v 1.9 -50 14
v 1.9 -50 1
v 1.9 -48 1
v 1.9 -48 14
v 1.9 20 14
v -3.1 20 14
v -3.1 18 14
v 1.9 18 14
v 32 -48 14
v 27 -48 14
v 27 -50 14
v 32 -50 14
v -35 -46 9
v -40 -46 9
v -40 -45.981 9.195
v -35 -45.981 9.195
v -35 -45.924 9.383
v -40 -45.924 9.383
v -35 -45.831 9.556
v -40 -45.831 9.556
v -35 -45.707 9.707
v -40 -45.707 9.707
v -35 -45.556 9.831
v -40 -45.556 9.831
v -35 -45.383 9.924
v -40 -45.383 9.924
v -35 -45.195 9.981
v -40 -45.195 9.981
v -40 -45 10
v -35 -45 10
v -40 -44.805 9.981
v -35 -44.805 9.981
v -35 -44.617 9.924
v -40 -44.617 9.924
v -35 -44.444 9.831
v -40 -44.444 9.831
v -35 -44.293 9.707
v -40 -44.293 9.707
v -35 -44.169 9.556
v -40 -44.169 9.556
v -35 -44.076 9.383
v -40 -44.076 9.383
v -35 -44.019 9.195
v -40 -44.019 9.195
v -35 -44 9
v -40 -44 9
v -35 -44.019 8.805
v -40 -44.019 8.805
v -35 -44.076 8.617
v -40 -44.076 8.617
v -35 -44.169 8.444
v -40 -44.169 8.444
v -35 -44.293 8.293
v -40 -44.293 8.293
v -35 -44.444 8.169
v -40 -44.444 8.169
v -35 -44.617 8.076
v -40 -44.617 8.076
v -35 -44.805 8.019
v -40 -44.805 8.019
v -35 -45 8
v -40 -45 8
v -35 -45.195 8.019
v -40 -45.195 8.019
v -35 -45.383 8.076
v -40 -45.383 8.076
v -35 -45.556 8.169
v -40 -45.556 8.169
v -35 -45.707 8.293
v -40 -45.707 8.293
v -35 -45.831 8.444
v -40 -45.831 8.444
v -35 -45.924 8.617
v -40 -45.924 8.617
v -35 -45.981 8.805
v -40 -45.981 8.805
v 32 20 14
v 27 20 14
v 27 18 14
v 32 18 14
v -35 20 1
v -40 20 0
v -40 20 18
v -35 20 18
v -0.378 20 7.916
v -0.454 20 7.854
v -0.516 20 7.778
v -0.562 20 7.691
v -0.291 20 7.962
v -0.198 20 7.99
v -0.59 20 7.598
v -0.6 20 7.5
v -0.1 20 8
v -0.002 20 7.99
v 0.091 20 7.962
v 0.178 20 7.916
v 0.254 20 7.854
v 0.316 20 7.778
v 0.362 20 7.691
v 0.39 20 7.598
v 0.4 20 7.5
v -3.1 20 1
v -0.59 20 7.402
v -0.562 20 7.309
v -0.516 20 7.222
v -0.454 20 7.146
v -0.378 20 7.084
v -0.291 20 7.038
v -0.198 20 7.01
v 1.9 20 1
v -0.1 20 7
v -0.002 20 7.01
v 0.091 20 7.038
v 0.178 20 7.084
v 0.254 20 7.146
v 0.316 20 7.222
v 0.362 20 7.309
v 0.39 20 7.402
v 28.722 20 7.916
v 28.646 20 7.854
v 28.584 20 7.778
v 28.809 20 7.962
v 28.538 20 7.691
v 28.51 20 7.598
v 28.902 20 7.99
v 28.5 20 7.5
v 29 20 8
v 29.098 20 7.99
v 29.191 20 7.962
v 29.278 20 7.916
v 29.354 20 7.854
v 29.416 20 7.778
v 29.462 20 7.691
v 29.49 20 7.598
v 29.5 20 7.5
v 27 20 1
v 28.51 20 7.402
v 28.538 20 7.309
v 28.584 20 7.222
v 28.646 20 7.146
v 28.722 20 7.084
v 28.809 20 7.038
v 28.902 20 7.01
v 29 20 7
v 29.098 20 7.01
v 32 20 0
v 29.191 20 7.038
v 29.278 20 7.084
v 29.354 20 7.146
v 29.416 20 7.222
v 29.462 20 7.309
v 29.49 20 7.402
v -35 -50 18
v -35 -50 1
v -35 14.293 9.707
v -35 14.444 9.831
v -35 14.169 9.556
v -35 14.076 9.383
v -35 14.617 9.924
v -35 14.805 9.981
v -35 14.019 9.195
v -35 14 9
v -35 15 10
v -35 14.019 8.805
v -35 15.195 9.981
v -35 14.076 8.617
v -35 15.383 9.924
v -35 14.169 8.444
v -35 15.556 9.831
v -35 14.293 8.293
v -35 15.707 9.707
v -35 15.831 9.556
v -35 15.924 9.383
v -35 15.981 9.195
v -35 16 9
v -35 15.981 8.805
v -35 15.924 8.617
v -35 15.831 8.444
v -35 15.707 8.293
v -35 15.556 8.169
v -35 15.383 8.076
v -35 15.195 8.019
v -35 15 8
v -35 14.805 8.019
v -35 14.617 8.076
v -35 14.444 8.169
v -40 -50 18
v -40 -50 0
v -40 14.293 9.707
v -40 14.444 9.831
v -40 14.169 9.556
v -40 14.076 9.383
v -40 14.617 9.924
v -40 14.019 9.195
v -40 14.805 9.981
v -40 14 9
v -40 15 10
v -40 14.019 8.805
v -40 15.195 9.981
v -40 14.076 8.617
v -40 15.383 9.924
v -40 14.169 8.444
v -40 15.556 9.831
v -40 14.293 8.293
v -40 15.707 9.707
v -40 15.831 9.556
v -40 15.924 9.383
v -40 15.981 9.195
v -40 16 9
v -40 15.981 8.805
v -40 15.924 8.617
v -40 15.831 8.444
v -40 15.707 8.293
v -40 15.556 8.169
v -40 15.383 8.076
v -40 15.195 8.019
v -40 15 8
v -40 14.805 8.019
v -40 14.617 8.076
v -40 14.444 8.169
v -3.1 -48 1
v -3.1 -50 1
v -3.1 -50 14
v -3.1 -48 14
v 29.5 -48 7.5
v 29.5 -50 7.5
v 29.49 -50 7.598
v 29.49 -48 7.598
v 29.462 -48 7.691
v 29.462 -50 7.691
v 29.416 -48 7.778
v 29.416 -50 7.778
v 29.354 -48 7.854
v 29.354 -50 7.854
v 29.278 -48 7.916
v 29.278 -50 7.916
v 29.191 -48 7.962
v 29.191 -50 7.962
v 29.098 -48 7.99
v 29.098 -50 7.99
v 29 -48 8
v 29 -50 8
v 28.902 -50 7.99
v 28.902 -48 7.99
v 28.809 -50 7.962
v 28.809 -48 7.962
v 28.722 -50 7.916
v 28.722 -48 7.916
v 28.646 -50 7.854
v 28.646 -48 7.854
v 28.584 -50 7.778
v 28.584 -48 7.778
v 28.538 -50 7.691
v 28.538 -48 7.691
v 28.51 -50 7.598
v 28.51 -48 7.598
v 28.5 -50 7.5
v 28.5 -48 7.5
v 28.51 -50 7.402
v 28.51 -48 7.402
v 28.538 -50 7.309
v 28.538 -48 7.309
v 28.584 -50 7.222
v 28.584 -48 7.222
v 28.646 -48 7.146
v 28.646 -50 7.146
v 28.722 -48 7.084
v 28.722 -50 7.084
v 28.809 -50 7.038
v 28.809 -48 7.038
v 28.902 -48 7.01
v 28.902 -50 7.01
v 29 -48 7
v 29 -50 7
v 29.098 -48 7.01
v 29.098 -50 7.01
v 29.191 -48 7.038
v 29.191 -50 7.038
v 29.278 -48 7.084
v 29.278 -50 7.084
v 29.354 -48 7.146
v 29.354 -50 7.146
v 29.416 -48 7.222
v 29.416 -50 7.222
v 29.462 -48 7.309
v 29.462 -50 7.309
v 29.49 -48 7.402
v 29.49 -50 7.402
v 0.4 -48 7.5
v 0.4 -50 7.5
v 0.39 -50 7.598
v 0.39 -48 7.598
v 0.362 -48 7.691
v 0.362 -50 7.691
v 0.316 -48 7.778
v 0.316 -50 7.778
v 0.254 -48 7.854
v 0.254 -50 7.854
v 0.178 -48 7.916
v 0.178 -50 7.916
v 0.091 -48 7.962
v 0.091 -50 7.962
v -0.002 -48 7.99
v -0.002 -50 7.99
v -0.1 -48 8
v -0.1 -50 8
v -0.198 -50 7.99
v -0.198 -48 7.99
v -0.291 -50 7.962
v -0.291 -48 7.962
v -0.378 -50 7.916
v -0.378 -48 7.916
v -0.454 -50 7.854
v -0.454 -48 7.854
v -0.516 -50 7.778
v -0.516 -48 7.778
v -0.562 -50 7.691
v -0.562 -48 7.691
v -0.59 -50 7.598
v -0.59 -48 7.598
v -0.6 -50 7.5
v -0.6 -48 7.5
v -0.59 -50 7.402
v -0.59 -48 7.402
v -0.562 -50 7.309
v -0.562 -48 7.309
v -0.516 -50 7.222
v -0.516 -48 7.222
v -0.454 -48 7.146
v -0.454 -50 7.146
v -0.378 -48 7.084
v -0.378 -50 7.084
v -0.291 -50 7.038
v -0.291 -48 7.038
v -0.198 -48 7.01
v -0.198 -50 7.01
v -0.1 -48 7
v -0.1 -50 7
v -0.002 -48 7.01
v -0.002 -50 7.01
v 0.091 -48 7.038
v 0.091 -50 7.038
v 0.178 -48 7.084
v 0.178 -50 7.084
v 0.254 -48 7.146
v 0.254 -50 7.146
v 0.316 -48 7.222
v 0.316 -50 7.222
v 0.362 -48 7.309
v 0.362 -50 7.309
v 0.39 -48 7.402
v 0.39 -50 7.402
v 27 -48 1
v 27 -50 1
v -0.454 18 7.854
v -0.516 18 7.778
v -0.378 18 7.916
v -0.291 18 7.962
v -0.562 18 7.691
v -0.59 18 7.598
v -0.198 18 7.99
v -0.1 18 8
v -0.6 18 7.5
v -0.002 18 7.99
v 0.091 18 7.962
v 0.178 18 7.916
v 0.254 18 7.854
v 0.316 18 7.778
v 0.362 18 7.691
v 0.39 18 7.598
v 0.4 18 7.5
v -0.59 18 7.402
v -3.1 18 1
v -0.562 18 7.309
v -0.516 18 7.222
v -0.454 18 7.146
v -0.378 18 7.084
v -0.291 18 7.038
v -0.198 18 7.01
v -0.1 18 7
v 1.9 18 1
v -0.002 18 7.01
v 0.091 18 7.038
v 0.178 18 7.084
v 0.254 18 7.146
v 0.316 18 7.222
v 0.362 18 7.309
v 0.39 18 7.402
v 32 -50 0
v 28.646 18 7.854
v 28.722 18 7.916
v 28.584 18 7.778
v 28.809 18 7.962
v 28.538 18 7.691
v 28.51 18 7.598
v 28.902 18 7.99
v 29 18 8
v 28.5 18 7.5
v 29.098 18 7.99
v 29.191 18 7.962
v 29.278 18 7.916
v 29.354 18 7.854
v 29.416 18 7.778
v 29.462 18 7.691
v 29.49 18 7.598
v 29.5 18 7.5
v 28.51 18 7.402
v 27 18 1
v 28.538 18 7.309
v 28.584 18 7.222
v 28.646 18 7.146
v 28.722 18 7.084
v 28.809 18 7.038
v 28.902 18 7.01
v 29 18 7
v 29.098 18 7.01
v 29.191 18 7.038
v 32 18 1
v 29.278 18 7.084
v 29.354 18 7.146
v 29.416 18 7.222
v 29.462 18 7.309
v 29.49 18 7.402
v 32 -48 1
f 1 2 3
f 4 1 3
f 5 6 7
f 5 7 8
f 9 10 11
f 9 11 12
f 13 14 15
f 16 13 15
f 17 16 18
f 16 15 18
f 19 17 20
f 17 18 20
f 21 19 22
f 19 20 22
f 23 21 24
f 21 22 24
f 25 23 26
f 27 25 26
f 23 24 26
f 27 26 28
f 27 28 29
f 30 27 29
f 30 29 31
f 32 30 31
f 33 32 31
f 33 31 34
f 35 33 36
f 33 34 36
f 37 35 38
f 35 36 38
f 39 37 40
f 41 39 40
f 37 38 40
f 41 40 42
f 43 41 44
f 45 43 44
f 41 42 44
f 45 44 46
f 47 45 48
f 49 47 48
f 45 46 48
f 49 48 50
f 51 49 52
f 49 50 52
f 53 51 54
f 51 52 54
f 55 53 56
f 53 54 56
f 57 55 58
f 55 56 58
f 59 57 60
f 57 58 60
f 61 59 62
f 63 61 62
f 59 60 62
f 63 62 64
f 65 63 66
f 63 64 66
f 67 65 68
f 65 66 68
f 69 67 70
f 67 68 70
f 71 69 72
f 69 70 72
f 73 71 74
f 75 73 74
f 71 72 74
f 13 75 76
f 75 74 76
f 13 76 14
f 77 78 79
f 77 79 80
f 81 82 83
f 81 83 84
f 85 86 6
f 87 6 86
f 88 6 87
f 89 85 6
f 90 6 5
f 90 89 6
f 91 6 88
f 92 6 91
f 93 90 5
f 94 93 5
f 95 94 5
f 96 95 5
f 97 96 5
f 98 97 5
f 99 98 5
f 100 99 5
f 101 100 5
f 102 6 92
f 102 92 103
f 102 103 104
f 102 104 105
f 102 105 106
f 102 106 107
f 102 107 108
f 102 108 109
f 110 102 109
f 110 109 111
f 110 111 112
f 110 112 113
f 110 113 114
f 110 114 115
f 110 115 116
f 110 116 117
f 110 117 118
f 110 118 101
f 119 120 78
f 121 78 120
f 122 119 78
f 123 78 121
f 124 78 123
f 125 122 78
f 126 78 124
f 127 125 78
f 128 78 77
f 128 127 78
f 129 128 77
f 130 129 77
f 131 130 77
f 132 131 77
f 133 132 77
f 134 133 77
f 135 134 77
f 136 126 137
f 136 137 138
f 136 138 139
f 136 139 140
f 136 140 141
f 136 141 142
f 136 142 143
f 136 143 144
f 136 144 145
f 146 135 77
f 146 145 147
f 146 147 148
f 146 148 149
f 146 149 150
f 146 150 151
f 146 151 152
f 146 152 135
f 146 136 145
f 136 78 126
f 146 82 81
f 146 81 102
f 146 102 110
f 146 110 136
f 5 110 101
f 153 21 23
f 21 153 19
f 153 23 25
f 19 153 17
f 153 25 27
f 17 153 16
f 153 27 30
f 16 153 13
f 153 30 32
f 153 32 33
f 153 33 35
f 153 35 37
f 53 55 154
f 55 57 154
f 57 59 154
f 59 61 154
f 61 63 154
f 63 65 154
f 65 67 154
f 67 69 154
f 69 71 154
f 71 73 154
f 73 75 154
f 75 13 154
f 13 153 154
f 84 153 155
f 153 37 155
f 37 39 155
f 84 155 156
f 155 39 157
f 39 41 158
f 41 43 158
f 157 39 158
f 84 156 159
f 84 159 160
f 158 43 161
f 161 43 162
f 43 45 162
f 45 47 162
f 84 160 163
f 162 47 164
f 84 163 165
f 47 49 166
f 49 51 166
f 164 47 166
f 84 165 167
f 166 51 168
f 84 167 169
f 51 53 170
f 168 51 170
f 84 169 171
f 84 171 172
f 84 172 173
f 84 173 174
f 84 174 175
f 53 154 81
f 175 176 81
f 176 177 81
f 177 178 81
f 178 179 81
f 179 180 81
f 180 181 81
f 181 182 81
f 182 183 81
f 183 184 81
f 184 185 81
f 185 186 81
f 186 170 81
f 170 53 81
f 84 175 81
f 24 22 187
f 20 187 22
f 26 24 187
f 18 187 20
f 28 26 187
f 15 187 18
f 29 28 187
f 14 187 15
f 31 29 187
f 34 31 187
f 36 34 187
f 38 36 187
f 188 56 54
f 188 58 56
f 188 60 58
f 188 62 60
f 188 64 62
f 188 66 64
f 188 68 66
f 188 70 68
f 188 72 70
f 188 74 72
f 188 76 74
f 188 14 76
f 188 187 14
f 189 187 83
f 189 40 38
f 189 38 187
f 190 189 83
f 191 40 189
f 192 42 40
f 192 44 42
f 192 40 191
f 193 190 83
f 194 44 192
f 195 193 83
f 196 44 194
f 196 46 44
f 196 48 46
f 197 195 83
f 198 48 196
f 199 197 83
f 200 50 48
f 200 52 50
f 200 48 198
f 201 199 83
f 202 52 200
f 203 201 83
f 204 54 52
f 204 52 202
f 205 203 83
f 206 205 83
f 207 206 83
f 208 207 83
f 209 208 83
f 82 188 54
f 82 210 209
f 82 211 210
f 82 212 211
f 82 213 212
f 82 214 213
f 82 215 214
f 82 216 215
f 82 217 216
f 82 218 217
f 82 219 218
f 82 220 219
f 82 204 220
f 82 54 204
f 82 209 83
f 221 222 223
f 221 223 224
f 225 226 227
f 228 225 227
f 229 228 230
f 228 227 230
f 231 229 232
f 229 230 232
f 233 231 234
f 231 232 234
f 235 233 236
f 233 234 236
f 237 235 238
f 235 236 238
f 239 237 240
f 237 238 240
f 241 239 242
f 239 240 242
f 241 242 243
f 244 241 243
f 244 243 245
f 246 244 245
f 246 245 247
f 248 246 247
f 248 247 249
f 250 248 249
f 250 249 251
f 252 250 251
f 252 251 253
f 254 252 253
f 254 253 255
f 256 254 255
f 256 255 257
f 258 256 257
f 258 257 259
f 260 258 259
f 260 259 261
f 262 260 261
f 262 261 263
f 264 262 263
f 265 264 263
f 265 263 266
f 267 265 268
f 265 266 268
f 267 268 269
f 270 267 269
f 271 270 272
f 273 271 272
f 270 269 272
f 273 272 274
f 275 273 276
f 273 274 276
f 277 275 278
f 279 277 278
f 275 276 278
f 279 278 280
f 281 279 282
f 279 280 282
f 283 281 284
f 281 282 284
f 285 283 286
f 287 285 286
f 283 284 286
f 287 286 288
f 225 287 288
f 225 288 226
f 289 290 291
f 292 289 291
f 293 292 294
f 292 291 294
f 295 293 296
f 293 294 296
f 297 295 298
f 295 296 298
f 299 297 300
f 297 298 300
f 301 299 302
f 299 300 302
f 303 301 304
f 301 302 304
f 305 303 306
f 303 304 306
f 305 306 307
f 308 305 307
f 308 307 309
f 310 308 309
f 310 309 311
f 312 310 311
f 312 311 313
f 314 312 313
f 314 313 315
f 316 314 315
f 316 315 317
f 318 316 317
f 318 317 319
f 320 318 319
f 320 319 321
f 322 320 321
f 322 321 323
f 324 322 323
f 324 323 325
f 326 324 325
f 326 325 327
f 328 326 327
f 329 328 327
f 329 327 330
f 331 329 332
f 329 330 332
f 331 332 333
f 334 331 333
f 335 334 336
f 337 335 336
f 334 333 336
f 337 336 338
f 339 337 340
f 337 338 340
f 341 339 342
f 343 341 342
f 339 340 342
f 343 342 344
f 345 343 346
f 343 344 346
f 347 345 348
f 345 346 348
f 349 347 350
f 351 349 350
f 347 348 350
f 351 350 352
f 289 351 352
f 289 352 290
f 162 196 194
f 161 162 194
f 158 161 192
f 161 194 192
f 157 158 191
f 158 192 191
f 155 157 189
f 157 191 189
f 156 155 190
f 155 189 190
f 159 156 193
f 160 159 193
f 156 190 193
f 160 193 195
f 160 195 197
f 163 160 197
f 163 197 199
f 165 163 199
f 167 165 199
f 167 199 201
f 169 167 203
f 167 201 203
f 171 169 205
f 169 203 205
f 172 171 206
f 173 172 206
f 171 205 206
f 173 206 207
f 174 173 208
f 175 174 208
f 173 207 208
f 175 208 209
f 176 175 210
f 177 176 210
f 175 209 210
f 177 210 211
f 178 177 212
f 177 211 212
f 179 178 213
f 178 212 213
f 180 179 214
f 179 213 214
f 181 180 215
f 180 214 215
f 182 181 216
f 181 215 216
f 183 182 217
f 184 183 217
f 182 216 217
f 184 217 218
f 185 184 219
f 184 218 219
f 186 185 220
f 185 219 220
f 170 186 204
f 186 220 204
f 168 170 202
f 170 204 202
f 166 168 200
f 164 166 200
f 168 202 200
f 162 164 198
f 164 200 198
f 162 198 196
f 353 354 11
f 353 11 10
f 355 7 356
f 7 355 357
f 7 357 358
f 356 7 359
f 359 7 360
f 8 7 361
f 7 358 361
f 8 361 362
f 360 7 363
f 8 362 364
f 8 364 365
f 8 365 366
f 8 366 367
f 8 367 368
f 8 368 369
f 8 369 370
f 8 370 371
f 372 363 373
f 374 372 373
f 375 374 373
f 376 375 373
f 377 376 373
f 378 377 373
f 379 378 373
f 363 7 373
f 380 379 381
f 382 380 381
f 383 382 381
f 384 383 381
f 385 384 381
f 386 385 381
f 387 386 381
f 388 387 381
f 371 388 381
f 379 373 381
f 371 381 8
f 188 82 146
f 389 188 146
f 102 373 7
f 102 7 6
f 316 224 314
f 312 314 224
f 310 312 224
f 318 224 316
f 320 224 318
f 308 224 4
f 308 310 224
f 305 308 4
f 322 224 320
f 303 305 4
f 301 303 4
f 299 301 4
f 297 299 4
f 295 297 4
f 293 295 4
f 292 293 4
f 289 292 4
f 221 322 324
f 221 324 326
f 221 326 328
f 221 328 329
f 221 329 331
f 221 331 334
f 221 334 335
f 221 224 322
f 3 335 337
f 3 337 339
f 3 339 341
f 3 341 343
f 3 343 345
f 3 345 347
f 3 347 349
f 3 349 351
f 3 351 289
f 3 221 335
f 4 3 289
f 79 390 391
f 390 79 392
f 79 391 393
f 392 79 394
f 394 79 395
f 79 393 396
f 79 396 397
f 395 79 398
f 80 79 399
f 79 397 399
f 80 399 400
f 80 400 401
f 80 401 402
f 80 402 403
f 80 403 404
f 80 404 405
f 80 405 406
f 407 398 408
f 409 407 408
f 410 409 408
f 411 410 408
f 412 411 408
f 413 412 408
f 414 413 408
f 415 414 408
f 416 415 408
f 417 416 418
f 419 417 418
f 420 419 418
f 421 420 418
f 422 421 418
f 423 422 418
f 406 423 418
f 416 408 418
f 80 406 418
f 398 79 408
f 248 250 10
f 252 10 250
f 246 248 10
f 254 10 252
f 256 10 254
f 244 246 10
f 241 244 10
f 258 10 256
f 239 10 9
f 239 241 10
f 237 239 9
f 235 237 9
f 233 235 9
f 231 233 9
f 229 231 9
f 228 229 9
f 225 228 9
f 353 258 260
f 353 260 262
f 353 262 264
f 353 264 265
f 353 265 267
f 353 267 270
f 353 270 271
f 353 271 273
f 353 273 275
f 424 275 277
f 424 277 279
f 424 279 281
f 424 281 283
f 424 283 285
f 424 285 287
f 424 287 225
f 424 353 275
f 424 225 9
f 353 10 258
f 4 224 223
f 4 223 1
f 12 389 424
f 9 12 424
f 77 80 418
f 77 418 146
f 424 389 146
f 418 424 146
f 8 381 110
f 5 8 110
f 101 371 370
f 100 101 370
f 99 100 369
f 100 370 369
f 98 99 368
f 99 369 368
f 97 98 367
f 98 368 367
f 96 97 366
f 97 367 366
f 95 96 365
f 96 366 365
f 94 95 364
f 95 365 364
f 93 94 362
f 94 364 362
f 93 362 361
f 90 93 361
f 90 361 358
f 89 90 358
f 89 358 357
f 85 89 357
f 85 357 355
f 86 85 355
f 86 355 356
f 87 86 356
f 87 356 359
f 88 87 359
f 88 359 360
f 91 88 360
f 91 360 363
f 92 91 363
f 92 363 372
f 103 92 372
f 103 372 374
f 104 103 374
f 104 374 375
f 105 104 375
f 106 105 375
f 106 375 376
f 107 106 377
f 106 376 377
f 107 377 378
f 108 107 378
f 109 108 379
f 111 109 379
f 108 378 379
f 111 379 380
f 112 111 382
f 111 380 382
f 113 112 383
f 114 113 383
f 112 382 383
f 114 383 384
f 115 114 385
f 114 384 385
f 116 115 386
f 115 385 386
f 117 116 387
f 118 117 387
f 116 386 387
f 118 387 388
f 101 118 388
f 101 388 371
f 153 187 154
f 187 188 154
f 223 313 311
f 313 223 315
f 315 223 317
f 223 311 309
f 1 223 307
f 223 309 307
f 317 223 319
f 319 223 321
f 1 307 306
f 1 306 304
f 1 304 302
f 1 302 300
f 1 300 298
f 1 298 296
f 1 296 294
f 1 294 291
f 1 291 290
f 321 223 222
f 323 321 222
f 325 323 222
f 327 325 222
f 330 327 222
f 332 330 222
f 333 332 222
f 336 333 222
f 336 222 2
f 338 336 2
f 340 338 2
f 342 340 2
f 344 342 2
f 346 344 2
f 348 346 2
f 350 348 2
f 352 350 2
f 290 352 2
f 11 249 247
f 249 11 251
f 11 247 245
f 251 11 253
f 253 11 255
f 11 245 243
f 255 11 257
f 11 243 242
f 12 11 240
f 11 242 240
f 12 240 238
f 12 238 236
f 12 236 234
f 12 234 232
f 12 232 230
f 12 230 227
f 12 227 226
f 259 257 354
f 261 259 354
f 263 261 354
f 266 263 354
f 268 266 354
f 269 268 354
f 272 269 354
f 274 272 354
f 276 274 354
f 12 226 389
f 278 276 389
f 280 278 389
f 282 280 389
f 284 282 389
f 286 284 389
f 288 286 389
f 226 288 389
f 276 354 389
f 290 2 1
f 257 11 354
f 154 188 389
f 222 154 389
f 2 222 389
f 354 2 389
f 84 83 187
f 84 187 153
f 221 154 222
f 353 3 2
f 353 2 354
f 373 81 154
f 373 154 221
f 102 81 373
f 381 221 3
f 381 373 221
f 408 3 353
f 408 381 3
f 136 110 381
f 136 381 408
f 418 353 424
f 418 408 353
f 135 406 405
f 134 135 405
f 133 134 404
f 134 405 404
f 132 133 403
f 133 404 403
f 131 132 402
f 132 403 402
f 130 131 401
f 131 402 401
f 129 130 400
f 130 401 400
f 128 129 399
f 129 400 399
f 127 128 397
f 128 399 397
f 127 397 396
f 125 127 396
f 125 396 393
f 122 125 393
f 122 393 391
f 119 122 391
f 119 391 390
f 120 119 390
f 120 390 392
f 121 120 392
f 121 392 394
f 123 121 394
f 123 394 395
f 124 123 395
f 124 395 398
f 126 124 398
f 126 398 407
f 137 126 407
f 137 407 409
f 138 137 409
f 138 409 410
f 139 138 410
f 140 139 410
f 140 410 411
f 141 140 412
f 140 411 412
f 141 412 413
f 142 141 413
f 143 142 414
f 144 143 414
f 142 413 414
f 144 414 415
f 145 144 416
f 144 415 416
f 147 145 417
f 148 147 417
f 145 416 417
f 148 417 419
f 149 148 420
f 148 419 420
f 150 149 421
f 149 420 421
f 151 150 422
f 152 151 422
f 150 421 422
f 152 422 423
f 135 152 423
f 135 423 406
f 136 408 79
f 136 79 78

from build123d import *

# Parameters (mm, degrees)
F0_W     = 72
F0_H     = 70
F1_DEPTH = 1
F2_W     = 5
F2_H     = 70
F3_DEPTH = 17
F4_R     = 1
F5_DEPTH = 5
F2_H_2   = 2
F6_DEPTH = 13
F7_R     = 0.5
F8_DEPTH = 70.001


with BuildPart() as f1:
    # F0 (on Top) → F1 (new body)
    with BuildSketch(Plane.XY):
        with Locations((-4, -15)):
            Rectangle(F0_W, F0_H)
    extrude(amount=F1_DEPTH)

    # F2 (on face) → F3 (join)
    with BuildSketch(Plane.XY.offset(1)):
        with Locations((-37.5, -15)):
            Rectangle(F2_W, F2_H)
    extrude(amount=F3_DEPTH)

    # F4 (on face) → F5 (cut, through all)
    with BuildSketch(Plane(origin=(-40, 0, 0), x_dir=(0, -1, 0), z_dir=(-1, 0, 0))):
        with Locations((-15, 9)):
            Circle(F4_R)
        with Locations((45, 9)):
            Circle(F4_R)
    extrude(amount=-F5_DEPTH, mode=Mode.SUBTRACT)

    # F2 (on face) → F6 (join)
    with BuildSketch(Plane.XY.offset(1)):
        with Locations((-0.6, 19)):
            Rectangle(F2_W, F2_H_2)
        with Locations((29.5, 19)):
            Rectangle(F2_W, F2_H_2)
        with Locations((-0.6, -49)):
            Rectangle(F2_W, F2_H_2)
        with Locations((29.5, -49)):
            Rectangle(F2_W, F2_H_2)
    extrude(amount=F6_DEPTH)

    # F7 (on face) → F8 (cut, through all)
    with BuildSketch(Plane.XZ.offset(50)):
        with Locations((-0.1, 7.5)):
            Circle(F7_R)
        with Locations((29, 7.5)):
            Circle(F7_R)
    extrude(amount=-F8_DEPTH, mode=Mode.SUBTRACT)


solid = f1.part
